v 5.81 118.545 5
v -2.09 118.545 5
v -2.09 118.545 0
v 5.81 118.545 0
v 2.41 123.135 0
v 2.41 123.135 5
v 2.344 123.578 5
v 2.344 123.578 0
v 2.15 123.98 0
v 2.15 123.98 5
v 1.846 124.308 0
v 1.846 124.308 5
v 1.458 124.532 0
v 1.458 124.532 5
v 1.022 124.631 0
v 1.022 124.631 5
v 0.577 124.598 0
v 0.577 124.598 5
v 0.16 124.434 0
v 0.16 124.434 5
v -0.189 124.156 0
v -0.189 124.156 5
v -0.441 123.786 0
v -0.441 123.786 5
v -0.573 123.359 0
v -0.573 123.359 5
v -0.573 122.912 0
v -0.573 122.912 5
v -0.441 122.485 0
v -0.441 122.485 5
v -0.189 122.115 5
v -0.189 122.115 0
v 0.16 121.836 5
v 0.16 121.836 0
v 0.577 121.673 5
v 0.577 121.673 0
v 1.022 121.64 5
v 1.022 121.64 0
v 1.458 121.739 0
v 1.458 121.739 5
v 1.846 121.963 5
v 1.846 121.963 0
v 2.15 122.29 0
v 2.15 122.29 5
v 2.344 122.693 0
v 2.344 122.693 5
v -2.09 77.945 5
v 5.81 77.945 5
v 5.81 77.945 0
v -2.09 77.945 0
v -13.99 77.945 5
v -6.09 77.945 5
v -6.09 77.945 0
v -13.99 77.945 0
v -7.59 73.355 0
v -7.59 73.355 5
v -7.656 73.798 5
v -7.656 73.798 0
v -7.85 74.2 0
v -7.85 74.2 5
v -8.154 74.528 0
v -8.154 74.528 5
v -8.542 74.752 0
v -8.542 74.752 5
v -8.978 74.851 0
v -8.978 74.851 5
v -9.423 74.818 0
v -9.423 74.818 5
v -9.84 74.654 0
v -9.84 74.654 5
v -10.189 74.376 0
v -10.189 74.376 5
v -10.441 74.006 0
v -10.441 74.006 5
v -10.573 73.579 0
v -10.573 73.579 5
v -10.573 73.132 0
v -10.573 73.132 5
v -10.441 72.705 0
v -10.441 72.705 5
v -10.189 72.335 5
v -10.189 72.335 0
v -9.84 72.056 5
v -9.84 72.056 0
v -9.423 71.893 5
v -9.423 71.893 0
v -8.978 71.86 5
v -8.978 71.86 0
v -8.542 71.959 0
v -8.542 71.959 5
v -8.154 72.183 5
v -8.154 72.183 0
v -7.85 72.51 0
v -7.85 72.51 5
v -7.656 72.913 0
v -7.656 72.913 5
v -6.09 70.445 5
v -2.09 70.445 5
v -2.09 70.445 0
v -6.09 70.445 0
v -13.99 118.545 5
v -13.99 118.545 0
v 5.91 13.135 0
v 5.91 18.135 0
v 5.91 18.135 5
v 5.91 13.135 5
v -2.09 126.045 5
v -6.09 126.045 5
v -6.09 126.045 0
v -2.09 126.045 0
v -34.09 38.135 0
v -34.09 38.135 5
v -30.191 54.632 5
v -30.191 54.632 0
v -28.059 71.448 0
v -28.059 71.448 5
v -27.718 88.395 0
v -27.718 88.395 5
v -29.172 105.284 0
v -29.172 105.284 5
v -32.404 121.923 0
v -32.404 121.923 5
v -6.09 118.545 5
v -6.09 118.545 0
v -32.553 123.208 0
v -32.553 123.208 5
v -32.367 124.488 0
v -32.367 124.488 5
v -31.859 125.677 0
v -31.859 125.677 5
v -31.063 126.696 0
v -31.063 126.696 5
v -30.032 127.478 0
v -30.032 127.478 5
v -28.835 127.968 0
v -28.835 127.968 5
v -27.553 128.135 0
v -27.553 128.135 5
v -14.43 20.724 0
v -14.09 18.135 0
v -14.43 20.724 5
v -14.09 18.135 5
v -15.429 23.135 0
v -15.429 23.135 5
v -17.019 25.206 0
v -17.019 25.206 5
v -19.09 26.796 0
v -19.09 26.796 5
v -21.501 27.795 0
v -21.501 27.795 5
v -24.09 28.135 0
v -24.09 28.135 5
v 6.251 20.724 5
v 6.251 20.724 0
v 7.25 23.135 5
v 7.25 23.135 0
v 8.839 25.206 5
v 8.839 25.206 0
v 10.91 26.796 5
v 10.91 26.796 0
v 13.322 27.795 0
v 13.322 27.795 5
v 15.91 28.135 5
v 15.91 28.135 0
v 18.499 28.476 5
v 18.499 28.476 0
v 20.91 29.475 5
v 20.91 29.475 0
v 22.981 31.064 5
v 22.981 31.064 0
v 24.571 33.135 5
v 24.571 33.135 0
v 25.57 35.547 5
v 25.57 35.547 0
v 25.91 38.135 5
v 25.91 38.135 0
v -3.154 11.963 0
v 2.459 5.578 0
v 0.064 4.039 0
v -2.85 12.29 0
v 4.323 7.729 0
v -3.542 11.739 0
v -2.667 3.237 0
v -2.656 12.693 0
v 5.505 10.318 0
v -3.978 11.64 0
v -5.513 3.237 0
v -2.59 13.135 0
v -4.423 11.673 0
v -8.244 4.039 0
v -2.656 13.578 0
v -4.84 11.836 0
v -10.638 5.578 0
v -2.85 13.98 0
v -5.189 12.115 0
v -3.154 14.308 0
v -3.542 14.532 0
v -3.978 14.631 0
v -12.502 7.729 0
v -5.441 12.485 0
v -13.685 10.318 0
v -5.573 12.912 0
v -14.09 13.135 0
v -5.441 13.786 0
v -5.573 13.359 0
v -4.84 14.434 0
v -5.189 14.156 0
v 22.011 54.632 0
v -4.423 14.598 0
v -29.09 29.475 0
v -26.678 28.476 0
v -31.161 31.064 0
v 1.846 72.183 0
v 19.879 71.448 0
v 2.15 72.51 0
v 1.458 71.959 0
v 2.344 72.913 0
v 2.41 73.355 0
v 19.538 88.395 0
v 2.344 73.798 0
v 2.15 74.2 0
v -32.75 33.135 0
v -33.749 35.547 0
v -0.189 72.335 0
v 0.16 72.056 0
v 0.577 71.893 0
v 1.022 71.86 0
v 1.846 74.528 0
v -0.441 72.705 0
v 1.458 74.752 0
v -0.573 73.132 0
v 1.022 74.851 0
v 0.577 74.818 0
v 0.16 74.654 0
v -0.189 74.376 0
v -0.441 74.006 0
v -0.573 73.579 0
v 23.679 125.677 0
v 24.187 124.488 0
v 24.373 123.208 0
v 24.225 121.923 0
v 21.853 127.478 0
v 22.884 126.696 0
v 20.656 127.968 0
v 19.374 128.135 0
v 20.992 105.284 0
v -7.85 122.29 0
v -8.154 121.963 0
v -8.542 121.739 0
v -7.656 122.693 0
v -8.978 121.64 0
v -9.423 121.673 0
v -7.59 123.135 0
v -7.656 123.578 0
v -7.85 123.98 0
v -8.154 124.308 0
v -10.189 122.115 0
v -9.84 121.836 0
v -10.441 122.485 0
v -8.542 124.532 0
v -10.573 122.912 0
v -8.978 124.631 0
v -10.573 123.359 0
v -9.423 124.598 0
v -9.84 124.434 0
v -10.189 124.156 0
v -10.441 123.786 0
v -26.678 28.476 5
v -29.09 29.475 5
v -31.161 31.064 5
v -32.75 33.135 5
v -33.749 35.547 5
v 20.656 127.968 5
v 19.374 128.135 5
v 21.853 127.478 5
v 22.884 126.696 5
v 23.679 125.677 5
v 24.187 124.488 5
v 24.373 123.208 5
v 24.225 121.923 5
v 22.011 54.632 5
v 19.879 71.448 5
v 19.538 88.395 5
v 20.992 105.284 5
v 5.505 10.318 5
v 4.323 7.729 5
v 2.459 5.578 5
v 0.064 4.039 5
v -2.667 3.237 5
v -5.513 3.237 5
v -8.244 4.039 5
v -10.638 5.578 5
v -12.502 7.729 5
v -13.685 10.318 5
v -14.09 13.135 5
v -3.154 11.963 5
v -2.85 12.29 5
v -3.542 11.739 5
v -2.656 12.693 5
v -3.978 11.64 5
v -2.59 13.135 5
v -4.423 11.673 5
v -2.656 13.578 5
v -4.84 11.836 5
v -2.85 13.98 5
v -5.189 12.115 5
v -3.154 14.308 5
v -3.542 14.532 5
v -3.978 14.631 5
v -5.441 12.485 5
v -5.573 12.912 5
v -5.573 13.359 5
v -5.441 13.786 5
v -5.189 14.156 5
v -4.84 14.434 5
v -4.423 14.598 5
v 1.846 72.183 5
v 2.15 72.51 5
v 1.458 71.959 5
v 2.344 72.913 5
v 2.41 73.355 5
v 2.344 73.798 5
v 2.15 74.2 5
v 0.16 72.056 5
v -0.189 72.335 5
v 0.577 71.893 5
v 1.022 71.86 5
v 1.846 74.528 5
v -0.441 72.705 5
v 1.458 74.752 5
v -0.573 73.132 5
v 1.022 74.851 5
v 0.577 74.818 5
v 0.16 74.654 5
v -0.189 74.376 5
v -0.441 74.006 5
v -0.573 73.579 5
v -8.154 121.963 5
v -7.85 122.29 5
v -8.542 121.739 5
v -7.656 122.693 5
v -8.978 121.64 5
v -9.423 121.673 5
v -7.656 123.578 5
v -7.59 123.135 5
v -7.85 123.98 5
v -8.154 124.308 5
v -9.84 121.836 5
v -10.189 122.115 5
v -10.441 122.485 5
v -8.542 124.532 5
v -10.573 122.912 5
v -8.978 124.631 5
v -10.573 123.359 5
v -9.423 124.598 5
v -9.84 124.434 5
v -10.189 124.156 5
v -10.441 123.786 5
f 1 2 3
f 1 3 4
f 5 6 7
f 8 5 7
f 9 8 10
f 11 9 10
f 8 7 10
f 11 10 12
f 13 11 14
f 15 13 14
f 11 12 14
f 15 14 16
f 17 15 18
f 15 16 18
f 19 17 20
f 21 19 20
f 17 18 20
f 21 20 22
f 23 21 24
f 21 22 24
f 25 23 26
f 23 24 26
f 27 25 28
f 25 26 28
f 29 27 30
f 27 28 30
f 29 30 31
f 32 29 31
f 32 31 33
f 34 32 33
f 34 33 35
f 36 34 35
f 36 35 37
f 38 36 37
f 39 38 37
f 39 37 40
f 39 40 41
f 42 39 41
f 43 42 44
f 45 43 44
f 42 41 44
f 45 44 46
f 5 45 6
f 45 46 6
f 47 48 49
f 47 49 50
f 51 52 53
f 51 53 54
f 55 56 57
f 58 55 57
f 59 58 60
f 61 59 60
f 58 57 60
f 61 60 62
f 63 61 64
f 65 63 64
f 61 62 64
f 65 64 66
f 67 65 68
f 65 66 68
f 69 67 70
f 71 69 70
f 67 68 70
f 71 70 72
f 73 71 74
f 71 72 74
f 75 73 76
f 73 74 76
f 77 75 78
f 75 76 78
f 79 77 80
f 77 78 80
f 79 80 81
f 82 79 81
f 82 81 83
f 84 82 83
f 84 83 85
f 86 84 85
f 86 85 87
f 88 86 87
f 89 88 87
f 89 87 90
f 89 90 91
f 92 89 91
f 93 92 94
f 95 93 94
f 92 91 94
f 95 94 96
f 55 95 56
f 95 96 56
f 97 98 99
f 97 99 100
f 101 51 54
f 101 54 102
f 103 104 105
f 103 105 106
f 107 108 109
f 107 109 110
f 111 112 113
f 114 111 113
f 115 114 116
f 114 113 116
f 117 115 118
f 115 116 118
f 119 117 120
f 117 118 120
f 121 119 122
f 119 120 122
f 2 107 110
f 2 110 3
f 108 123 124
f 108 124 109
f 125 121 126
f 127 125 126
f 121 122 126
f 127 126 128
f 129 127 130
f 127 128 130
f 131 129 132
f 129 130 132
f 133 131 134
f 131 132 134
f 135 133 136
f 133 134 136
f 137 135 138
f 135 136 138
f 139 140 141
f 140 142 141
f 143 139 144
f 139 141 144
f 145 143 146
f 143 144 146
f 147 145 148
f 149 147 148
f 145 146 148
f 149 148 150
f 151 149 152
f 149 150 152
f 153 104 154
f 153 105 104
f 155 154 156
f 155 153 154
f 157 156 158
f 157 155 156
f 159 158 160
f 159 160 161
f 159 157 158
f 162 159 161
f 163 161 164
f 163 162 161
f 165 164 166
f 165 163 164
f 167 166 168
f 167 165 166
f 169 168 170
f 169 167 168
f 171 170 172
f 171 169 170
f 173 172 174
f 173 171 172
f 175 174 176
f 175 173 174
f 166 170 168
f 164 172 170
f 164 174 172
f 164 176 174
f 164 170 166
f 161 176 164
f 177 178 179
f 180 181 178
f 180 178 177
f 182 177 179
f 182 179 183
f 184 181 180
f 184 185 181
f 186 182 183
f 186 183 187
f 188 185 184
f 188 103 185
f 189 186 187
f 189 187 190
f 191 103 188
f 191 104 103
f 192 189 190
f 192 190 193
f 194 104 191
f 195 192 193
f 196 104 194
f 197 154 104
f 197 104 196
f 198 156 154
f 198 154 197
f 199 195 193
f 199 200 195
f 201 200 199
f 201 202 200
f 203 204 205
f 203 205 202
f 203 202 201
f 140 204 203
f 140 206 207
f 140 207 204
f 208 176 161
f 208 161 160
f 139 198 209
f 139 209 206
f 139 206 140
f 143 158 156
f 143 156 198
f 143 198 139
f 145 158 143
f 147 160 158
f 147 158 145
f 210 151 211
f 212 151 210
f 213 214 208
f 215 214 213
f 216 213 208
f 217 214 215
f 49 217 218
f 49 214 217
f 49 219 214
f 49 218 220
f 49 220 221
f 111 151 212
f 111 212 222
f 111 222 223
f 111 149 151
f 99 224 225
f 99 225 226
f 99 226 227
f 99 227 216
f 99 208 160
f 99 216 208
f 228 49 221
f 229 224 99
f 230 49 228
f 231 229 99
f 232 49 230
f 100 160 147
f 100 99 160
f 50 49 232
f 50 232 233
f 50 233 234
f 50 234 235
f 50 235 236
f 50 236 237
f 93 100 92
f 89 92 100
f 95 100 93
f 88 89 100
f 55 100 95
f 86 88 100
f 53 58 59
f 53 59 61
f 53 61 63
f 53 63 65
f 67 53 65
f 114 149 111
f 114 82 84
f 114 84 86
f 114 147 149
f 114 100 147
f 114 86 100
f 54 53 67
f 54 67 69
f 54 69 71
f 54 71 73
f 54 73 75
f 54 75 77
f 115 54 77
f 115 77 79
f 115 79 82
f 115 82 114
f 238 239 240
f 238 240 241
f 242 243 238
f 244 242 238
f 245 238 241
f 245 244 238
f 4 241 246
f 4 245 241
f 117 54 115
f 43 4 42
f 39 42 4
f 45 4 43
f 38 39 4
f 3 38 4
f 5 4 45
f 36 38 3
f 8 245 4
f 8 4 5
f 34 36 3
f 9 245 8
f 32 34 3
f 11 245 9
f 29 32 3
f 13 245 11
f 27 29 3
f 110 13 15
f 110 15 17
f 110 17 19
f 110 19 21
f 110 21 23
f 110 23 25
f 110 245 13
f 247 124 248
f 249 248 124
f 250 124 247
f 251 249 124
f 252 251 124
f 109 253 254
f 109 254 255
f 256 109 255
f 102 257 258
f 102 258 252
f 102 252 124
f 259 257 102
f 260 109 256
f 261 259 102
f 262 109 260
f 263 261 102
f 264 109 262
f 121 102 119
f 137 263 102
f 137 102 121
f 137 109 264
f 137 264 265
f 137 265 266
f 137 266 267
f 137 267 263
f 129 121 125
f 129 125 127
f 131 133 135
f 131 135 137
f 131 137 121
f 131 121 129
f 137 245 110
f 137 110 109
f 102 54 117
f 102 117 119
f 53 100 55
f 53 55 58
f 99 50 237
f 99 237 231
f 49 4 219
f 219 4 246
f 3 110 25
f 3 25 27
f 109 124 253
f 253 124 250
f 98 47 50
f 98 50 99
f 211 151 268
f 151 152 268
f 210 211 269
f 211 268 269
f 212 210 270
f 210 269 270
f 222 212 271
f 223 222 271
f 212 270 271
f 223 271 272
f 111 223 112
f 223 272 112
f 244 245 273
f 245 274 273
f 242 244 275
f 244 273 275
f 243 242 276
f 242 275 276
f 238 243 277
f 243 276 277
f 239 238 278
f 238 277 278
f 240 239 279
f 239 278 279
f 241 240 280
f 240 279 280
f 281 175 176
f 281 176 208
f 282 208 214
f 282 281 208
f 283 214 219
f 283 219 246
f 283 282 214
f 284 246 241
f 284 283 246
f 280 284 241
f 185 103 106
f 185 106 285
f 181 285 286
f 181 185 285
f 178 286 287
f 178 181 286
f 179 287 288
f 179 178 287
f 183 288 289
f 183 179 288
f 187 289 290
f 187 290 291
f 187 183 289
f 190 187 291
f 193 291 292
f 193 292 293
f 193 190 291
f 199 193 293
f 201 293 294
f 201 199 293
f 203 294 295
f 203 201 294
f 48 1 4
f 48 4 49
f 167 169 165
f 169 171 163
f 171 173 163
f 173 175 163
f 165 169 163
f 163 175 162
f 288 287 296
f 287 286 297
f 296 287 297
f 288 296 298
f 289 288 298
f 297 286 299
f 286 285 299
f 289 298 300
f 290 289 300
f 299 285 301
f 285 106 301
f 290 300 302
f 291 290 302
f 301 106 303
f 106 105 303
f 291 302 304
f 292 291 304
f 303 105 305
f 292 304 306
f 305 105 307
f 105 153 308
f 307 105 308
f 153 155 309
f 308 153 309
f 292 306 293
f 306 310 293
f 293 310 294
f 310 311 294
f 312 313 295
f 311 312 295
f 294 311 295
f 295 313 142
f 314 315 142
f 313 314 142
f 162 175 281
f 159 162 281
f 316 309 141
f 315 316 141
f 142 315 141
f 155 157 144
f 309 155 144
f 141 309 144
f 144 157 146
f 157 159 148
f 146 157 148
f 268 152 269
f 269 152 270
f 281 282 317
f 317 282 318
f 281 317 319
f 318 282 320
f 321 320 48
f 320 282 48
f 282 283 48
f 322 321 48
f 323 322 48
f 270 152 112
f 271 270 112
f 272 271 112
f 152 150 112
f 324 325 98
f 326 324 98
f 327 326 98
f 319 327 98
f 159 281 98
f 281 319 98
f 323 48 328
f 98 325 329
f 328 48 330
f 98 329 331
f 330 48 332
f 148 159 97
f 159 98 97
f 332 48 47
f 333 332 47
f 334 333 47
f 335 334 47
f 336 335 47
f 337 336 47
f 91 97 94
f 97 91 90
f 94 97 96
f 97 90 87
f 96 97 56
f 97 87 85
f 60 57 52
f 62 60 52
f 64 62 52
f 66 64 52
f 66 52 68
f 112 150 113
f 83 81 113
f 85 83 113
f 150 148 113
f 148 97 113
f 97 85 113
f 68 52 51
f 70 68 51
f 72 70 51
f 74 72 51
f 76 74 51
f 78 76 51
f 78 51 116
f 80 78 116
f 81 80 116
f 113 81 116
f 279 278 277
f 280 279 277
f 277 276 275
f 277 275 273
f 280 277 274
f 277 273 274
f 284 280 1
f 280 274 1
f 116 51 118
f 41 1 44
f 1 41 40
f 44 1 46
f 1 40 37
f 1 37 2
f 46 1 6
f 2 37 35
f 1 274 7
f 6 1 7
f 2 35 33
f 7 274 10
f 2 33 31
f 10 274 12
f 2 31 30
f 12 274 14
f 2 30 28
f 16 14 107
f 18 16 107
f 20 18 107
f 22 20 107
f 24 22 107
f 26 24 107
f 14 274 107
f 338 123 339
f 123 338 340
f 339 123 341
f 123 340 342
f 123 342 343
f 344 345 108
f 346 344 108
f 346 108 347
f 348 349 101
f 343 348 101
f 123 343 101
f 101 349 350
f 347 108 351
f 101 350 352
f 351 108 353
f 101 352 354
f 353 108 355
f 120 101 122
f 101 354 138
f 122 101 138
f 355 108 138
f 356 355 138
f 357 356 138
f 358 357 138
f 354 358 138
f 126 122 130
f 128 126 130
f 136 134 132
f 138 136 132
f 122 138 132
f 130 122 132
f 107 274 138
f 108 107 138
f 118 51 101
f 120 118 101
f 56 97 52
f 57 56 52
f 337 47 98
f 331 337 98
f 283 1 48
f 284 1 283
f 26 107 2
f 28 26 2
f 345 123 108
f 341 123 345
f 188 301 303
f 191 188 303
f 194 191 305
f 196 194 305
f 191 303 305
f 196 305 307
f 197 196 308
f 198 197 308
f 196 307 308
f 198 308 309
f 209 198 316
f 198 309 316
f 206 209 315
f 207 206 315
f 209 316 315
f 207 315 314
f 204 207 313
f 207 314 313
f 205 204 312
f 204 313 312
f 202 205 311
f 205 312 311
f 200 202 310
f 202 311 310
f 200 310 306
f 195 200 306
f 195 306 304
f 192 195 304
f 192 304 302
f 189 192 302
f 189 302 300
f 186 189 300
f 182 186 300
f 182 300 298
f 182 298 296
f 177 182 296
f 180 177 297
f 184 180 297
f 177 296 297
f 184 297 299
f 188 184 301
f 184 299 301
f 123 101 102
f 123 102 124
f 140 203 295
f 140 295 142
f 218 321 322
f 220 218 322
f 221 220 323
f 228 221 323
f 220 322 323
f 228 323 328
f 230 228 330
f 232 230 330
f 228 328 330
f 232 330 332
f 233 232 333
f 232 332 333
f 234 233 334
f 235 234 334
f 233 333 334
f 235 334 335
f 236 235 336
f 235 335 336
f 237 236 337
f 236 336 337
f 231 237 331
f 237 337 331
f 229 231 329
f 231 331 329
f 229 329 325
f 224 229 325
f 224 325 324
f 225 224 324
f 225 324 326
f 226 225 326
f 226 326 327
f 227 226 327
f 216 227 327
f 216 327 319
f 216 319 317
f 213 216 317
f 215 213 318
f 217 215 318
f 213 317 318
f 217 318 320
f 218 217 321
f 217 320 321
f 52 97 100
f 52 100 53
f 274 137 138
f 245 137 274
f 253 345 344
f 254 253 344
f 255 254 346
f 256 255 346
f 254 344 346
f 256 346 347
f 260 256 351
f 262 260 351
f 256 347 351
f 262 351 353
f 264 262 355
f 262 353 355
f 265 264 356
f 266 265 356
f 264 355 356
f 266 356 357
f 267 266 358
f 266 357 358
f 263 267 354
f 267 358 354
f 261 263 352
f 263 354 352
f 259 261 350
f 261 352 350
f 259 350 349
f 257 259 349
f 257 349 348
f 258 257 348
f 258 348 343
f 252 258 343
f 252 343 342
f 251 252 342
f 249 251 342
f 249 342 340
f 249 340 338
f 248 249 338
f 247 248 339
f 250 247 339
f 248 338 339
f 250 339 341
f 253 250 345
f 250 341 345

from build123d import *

# Parameters (mm, degrees)
RESSALTO_EXTRUS_O1_DEPTH = 5
ESBO_O2_R                = 1.5
CORTE_EXTRUS_O1_DEPTH    = 5
FILETE1_R                = 10
CORTE_EXTRUS_O2_DEPTH    = 5
ESBO_O4_R                = 1.5
CORTE_EXTRUS_O3_DEPTH    = 5
FILETE2_R                = 5
CORTE_EXTRUS_O4_DEPTH    = 5


with BuildPart() as part:
    # Esboço1 → Ressalto-extrusão1 (new body)
    with BuildSketch(Plane.XY):
        with BuildLine():
            Line((-14.089663978, 13.135393664), (-14.089663978, 28.135393664))
            Line((-14.089663978, 28.135393664), (-34.089663978, 28.135393664))
            Line((-34.089663978, 28.135393664), (-34.089663978, 128.135393664))
            Line((-34.089663978, 128.135393664), (25.910336022, 128.135393664))
            Line((25.910336022, 128.135393664), (25.910336022, 28.135393664))
            Line((25.910336022, 28.135393664), (5.910336022, 28.135393664))
            Line((5.910336022, 28.135393664), (5.910336022, 13.135393664))
            ThreePointArc((5.910336022, 13.135393664), (-4.089663978, 3.135393664), (-14.089663978, 13.135393664))
        make_face()
    extrude(amount=RESSALTO_EXTRUS_O1_DEPTH)

    # Esboço2 → Corte-extrusão1 (cut)
    with BuildSketch(Plane.XY.offset(5)):
        with Locations((-4.089663978, 13.135393664)):
            Circle(ESBO_O2_R)
    extrude(amount=-CORTE_EXTRUS_O1_DEPTH, mode=Mode.SUBTRACT)

    # Filete1
    filete1_edges = [part.edges().sort_by_distance(p)[0] for p in [
        (5.910336022, 28.135393664, 2.5),
        (-14.089663978, 28.135393664, 2.5),
    ]]
    fillet(filete1_edges, radius=FILETE1_R)
    filete1_2_edges = [part.edges().sort_by_distance(p)[0] for p in [
        (25.910336022, 28.135393664, 2.5),
        (-34.089663978, 28.135393664, 2.5),
    ]]
    fillet(filete1_2_edges, radius=FILETE1_R - 0.0001)  # a hair under: the kernel refuses the full size

    # Esboço3 → Corte-extrusão2 (cut)
    with BuildSketch(Plane.XY.offset(5)):
        with BuildLine():
            ThreePointArc((-34.089663978, 38.135393664), (-27.631189305, 83.135393664), (-34.089663978, 128.135393664))
            Line((-34.089663978, 128.135393664), (-34.089663978, 38.135393664))
        make_face()
        with BuildLine():
            ThreePointArc((25.910336022, 38.135393664), (19.45186135, 83.135393664), (25.910336022, 128.135393664))
            Line((25.910336022, 128.135393664), (25.910336022, 38.135393664))
        make_face()
    extrude(amount=-CORTE_EXTRUS_O2_DEPTH, mode=Mode.SUBTRACT)

    # Esboço4 → Corte-extrusão3 (cut)
    with BuildSketch(Plane.XY.offset(5)):
        with Locations((-9.089663978, 123.135393664)):
            Circle(ESBO_O4_R)
        with Locations((0.910336022, 123.135393664)):
            Circle(ESBO_O4_R)
        with Locations((-9.089663978, 73.355393664)):
            Circle(ESBO_O4_R)
        with Locations((0.910336022, 73.355393664)):
            Circle(ESBO_O4_R)
    extrude(amount=-CORTE_EXTRUS_O3_DEPTH, mode=Mode.SUBTRACT)

    # Filete2
    filete2_edges = [part.edges().sort_by_distance(p)[0] for p in [
        (-34.089663978, 128.135393664, 2.5),
        (25.910336022, 128.135393664, 2.5),
    ]]
    fillet(filete2_edges, radius=FILETE2_R)

    # Esboço5 → Corte-extrusão4 (cut)
    with BuildSketch(Plane.XY.offset(5)):
        Polygon((-13.989663978, 118.545393664), (-6.089663978, 118.545393664), (-6.089663978, 126.045393664), (-2.089663978, 126.045393664), (-2.089663978, 118.545393664), (5.810336022, 118.545393664), (5.810336022, 77.945393664), (-2.089663978, 77.945393664), (-2.089663978, 70.445393664), (-6.089663978, 70.445393664), (-6.089663978, 77.945393664), (-13.989663978, 77.945393664), align=None)
    extrude(amount=-CORTE_EXTRUS_O4_DEPTH, mode=Mode.SUBTRACT)


solid = part.part
